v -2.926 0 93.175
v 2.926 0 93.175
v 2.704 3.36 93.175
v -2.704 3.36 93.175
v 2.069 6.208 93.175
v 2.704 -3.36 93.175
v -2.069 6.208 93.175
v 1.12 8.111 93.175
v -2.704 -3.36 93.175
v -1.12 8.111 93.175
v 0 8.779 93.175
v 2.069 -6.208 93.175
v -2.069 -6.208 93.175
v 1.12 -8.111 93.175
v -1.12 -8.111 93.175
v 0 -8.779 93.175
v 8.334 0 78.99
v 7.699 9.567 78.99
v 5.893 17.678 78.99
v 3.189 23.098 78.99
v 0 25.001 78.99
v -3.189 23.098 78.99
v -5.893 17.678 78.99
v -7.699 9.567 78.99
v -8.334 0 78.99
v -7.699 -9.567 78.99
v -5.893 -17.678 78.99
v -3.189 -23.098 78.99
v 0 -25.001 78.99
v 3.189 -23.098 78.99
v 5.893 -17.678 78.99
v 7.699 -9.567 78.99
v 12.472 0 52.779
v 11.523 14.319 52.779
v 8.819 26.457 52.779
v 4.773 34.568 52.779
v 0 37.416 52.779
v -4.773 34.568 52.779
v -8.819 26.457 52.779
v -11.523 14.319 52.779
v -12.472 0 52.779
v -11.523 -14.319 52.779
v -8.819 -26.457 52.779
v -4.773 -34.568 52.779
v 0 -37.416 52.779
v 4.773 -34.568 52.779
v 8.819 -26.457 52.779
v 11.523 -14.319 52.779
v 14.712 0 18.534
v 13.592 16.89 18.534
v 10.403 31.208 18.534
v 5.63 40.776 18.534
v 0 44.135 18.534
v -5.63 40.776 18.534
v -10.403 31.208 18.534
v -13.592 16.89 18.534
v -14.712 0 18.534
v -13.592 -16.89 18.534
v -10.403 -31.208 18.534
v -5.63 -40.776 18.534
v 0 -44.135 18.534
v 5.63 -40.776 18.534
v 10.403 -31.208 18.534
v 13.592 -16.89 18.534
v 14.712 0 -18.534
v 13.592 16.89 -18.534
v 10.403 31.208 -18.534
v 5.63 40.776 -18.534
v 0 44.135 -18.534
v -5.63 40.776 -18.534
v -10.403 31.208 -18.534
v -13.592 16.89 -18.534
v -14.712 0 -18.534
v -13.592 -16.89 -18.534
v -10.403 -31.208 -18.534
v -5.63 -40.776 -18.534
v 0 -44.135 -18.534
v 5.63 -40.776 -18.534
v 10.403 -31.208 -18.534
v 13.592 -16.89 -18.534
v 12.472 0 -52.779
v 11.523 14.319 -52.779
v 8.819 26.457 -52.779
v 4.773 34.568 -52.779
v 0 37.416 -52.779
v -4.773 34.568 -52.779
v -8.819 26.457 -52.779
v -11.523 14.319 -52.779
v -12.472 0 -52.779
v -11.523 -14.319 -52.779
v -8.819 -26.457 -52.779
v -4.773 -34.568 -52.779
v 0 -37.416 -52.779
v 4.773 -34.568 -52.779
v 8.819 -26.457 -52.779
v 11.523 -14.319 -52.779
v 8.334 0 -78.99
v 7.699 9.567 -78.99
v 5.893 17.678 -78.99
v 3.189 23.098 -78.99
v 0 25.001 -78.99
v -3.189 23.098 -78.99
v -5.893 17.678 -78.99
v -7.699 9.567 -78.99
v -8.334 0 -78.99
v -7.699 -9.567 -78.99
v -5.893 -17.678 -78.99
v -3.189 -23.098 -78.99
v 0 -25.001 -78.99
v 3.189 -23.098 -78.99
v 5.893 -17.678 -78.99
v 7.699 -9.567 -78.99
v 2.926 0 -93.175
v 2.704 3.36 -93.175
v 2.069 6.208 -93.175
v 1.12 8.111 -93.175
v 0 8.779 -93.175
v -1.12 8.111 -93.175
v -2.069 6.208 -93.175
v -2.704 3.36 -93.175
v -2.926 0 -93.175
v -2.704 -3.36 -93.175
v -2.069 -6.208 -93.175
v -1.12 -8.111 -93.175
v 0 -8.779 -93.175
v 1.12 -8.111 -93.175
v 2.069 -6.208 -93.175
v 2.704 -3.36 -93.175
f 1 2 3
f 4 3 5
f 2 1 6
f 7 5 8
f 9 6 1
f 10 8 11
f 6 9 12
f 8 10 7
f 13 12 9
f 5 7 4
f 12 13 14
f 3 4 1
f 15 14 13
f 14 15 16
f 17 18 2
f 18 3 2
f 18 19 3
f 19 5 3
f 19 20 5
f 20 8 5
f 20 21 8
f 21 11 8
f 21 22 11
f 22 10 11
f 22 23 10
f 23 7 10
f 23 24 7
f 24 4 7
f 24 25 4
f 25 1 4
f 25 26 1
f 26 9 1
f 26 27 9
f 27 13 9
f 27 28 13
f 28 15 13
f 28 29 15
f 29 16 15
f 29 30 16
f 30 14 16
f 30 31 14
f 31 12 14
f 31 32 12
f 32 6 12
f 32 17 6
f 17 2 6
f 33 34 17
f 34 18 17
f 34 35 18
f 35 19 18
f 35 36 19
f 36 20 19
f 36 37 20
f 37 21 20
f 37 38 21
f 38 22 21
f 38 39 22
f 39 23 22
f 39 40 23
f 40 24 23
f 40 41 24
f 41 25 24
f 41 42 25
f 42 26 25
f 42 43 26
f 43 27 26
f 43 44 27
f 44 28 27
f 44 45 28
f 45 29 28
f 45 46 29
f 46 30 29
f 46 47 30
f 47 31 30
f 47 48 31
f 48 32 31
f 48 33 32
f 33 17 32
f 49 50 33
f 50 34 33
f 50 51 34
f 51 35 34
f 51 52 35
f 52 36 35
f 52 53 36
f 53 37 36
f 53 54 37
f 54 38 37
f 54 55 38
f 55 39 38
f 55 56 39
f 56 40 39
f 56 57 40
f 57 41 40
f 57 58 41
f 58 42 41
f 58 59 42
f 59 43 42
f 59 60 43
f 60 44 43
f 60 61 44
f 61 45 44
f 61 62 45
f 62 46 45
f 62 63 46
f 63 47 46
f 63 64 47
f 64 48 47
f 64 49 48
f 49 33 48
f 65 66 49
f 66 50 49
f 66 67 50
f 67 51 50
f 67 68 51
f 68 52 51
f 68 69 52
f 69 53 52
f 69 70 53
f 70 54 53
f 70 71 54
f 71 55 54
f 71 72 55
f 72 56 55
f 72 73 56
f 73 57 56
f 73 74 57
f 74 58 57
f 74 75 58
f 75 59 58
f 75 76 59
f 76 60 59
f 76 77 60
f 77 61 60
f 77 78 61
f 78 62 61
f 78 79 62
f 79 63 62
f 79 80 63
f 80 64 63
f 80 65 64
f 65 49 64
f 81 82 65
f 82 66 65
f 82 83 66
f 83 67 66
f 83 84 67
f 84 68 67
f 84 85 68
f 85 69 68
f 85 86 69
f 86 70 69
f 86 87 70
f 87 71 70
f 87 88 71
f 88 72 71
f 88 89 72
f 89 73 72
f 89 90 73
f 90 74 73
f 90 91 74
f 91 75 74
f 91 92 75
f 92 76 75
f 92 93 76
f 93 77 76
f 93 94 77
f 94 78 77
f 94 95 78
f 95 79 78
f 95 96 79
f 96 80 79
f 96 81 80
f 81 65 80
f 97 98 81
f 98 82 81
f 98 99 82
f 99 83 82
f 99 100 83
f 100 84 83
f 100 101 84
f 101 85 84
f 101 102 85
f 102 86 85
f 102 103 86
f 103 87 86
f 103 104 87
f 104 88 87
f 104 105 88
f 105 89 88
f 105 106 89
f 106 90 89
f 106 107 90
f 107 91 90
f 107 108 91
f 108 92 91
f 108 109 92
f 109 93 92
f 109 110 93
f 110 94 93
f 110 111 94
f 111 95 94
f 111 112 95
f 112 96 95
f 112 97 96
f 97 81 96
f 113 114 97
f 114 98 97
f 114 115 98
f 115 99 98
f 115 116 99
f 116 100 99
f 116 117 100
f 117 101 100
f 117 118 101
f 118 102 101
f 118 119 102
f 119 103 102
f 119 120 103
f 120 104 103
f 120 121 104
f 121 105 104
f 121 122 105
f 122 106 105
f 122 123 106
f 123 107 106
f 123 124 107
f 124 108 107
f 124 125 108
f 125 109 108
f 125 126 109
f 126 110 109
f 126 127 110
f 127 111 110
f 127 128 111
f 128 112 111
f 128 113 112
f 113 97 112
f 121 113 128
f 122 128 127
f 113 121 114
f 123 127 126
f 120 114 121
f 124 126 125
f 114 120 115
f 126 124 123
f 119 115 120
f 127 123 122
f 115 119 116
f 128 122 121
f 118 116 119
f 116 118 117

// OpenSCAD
// Generated by SolidPython 1.0.1 on 2020-07-29 00:46:45


scale(v = [3, 9, 19]) {
	sphere(r = 5);
}
/***********************************************
*********      SolidPython code:      **********
************************************************
 
# import packages: SolidPython
from solid import *
from solid.utils import *
from itertools import chain, combinations, permutations


class Resize:

    def __init__(self, scad_file):
        self.scad_file = scad_file
        #self.scad_file = import_scad(scad_file)
        # cone/cylinder param:
        self.r1 = 0
        self.r2 = 0
        self.h = 0
        # rectangular prism param:
        self.w = 0
        self.l = 0
        # ellipse param:
        self.r = 0

    # import OpenScad code (file name corresponds to shape)


    # classify shape + parameters
    def assign(self, param1, param2, param3):
        if self.scad_file == 'cone.scad':
            self.r1 = param1
            self.r2 = param2
            self.h = param3
        elif self.scad_file == 'cylinder.scad':
            self.r1 = param1
            self.r2 = param2
            self.h = param3
        elif self.scad_file == 'rectangularPrism.scad':
            self.h = param1
            self.l = param2
            self.w = param3
        else:
            self.r = param1
            self.h = param2

    # resize parameters
    def iterate(self):
        x = range(3, 20, 2)
        i = 1
        if self.scad_file == 'cone.scad':
            tempList = list(permutations(x, 2))
            for temp in tempList:
                param1 = temp[0]
                param2 = temp[1]
                filepath = 'produced_scad_files/' + 'cone' + str(param1) + '_' + str(param2) + '_' + '.scad'
                scad_render_to_file(cylinder(h=param1, r1=param2, r2=0), filepath)

        elif self.scad_file == 'cylinder.scad':
            tempList = list(permutations(x, 3))
            for temp in tempList:
                param1 = temp[0]
                param2 = temp[1]
                filepath = 'produced_scad_files/' + 'cylinder' + str(param1) + '_' + str(param2) + '_' + '.scad'
                scad_render_to_file(cylinder(h=param1, r1=param2, r2=param2), filepath)

        elif self.scad_file == 'rectangularPrism.scad':
            tempList = list(permutations(x, 3))
            for temp in tempList:
                param1 = temp[0]
                param2 = temp[1]
                param3 = temp[2]
                filepath = 'produced_scad_files/' + 'rectangularPrism' + str(param1) + '_' + str(param2) + '_' + str(
                    param3) + '.scad'
                scad_render_to_file(cube(size=(param1, param2, param3)), filepath)

        elif self.scad_file == 'ellipse.scad':
            tempList = list(permutations(x, 4))
            for temp in tempList:
                param1 = temp[0]
                param2 = temp[1]
                param3 = temp[2]
                param4 = temp[3]
                filepath = 'produced_scad_files/' + 'ellipse' + str(param1) + '_' + str(param2) + '_' + str(param3) + '_' + str(param4) + '.scad'
                scad_render_to_file(scale([param1, param2, param3])(sphere(r=param4)), filepath)

    def render_to_scadfile(self):
        scad_render_to_file(scad, 'example.scad') 
 
************************************************/
